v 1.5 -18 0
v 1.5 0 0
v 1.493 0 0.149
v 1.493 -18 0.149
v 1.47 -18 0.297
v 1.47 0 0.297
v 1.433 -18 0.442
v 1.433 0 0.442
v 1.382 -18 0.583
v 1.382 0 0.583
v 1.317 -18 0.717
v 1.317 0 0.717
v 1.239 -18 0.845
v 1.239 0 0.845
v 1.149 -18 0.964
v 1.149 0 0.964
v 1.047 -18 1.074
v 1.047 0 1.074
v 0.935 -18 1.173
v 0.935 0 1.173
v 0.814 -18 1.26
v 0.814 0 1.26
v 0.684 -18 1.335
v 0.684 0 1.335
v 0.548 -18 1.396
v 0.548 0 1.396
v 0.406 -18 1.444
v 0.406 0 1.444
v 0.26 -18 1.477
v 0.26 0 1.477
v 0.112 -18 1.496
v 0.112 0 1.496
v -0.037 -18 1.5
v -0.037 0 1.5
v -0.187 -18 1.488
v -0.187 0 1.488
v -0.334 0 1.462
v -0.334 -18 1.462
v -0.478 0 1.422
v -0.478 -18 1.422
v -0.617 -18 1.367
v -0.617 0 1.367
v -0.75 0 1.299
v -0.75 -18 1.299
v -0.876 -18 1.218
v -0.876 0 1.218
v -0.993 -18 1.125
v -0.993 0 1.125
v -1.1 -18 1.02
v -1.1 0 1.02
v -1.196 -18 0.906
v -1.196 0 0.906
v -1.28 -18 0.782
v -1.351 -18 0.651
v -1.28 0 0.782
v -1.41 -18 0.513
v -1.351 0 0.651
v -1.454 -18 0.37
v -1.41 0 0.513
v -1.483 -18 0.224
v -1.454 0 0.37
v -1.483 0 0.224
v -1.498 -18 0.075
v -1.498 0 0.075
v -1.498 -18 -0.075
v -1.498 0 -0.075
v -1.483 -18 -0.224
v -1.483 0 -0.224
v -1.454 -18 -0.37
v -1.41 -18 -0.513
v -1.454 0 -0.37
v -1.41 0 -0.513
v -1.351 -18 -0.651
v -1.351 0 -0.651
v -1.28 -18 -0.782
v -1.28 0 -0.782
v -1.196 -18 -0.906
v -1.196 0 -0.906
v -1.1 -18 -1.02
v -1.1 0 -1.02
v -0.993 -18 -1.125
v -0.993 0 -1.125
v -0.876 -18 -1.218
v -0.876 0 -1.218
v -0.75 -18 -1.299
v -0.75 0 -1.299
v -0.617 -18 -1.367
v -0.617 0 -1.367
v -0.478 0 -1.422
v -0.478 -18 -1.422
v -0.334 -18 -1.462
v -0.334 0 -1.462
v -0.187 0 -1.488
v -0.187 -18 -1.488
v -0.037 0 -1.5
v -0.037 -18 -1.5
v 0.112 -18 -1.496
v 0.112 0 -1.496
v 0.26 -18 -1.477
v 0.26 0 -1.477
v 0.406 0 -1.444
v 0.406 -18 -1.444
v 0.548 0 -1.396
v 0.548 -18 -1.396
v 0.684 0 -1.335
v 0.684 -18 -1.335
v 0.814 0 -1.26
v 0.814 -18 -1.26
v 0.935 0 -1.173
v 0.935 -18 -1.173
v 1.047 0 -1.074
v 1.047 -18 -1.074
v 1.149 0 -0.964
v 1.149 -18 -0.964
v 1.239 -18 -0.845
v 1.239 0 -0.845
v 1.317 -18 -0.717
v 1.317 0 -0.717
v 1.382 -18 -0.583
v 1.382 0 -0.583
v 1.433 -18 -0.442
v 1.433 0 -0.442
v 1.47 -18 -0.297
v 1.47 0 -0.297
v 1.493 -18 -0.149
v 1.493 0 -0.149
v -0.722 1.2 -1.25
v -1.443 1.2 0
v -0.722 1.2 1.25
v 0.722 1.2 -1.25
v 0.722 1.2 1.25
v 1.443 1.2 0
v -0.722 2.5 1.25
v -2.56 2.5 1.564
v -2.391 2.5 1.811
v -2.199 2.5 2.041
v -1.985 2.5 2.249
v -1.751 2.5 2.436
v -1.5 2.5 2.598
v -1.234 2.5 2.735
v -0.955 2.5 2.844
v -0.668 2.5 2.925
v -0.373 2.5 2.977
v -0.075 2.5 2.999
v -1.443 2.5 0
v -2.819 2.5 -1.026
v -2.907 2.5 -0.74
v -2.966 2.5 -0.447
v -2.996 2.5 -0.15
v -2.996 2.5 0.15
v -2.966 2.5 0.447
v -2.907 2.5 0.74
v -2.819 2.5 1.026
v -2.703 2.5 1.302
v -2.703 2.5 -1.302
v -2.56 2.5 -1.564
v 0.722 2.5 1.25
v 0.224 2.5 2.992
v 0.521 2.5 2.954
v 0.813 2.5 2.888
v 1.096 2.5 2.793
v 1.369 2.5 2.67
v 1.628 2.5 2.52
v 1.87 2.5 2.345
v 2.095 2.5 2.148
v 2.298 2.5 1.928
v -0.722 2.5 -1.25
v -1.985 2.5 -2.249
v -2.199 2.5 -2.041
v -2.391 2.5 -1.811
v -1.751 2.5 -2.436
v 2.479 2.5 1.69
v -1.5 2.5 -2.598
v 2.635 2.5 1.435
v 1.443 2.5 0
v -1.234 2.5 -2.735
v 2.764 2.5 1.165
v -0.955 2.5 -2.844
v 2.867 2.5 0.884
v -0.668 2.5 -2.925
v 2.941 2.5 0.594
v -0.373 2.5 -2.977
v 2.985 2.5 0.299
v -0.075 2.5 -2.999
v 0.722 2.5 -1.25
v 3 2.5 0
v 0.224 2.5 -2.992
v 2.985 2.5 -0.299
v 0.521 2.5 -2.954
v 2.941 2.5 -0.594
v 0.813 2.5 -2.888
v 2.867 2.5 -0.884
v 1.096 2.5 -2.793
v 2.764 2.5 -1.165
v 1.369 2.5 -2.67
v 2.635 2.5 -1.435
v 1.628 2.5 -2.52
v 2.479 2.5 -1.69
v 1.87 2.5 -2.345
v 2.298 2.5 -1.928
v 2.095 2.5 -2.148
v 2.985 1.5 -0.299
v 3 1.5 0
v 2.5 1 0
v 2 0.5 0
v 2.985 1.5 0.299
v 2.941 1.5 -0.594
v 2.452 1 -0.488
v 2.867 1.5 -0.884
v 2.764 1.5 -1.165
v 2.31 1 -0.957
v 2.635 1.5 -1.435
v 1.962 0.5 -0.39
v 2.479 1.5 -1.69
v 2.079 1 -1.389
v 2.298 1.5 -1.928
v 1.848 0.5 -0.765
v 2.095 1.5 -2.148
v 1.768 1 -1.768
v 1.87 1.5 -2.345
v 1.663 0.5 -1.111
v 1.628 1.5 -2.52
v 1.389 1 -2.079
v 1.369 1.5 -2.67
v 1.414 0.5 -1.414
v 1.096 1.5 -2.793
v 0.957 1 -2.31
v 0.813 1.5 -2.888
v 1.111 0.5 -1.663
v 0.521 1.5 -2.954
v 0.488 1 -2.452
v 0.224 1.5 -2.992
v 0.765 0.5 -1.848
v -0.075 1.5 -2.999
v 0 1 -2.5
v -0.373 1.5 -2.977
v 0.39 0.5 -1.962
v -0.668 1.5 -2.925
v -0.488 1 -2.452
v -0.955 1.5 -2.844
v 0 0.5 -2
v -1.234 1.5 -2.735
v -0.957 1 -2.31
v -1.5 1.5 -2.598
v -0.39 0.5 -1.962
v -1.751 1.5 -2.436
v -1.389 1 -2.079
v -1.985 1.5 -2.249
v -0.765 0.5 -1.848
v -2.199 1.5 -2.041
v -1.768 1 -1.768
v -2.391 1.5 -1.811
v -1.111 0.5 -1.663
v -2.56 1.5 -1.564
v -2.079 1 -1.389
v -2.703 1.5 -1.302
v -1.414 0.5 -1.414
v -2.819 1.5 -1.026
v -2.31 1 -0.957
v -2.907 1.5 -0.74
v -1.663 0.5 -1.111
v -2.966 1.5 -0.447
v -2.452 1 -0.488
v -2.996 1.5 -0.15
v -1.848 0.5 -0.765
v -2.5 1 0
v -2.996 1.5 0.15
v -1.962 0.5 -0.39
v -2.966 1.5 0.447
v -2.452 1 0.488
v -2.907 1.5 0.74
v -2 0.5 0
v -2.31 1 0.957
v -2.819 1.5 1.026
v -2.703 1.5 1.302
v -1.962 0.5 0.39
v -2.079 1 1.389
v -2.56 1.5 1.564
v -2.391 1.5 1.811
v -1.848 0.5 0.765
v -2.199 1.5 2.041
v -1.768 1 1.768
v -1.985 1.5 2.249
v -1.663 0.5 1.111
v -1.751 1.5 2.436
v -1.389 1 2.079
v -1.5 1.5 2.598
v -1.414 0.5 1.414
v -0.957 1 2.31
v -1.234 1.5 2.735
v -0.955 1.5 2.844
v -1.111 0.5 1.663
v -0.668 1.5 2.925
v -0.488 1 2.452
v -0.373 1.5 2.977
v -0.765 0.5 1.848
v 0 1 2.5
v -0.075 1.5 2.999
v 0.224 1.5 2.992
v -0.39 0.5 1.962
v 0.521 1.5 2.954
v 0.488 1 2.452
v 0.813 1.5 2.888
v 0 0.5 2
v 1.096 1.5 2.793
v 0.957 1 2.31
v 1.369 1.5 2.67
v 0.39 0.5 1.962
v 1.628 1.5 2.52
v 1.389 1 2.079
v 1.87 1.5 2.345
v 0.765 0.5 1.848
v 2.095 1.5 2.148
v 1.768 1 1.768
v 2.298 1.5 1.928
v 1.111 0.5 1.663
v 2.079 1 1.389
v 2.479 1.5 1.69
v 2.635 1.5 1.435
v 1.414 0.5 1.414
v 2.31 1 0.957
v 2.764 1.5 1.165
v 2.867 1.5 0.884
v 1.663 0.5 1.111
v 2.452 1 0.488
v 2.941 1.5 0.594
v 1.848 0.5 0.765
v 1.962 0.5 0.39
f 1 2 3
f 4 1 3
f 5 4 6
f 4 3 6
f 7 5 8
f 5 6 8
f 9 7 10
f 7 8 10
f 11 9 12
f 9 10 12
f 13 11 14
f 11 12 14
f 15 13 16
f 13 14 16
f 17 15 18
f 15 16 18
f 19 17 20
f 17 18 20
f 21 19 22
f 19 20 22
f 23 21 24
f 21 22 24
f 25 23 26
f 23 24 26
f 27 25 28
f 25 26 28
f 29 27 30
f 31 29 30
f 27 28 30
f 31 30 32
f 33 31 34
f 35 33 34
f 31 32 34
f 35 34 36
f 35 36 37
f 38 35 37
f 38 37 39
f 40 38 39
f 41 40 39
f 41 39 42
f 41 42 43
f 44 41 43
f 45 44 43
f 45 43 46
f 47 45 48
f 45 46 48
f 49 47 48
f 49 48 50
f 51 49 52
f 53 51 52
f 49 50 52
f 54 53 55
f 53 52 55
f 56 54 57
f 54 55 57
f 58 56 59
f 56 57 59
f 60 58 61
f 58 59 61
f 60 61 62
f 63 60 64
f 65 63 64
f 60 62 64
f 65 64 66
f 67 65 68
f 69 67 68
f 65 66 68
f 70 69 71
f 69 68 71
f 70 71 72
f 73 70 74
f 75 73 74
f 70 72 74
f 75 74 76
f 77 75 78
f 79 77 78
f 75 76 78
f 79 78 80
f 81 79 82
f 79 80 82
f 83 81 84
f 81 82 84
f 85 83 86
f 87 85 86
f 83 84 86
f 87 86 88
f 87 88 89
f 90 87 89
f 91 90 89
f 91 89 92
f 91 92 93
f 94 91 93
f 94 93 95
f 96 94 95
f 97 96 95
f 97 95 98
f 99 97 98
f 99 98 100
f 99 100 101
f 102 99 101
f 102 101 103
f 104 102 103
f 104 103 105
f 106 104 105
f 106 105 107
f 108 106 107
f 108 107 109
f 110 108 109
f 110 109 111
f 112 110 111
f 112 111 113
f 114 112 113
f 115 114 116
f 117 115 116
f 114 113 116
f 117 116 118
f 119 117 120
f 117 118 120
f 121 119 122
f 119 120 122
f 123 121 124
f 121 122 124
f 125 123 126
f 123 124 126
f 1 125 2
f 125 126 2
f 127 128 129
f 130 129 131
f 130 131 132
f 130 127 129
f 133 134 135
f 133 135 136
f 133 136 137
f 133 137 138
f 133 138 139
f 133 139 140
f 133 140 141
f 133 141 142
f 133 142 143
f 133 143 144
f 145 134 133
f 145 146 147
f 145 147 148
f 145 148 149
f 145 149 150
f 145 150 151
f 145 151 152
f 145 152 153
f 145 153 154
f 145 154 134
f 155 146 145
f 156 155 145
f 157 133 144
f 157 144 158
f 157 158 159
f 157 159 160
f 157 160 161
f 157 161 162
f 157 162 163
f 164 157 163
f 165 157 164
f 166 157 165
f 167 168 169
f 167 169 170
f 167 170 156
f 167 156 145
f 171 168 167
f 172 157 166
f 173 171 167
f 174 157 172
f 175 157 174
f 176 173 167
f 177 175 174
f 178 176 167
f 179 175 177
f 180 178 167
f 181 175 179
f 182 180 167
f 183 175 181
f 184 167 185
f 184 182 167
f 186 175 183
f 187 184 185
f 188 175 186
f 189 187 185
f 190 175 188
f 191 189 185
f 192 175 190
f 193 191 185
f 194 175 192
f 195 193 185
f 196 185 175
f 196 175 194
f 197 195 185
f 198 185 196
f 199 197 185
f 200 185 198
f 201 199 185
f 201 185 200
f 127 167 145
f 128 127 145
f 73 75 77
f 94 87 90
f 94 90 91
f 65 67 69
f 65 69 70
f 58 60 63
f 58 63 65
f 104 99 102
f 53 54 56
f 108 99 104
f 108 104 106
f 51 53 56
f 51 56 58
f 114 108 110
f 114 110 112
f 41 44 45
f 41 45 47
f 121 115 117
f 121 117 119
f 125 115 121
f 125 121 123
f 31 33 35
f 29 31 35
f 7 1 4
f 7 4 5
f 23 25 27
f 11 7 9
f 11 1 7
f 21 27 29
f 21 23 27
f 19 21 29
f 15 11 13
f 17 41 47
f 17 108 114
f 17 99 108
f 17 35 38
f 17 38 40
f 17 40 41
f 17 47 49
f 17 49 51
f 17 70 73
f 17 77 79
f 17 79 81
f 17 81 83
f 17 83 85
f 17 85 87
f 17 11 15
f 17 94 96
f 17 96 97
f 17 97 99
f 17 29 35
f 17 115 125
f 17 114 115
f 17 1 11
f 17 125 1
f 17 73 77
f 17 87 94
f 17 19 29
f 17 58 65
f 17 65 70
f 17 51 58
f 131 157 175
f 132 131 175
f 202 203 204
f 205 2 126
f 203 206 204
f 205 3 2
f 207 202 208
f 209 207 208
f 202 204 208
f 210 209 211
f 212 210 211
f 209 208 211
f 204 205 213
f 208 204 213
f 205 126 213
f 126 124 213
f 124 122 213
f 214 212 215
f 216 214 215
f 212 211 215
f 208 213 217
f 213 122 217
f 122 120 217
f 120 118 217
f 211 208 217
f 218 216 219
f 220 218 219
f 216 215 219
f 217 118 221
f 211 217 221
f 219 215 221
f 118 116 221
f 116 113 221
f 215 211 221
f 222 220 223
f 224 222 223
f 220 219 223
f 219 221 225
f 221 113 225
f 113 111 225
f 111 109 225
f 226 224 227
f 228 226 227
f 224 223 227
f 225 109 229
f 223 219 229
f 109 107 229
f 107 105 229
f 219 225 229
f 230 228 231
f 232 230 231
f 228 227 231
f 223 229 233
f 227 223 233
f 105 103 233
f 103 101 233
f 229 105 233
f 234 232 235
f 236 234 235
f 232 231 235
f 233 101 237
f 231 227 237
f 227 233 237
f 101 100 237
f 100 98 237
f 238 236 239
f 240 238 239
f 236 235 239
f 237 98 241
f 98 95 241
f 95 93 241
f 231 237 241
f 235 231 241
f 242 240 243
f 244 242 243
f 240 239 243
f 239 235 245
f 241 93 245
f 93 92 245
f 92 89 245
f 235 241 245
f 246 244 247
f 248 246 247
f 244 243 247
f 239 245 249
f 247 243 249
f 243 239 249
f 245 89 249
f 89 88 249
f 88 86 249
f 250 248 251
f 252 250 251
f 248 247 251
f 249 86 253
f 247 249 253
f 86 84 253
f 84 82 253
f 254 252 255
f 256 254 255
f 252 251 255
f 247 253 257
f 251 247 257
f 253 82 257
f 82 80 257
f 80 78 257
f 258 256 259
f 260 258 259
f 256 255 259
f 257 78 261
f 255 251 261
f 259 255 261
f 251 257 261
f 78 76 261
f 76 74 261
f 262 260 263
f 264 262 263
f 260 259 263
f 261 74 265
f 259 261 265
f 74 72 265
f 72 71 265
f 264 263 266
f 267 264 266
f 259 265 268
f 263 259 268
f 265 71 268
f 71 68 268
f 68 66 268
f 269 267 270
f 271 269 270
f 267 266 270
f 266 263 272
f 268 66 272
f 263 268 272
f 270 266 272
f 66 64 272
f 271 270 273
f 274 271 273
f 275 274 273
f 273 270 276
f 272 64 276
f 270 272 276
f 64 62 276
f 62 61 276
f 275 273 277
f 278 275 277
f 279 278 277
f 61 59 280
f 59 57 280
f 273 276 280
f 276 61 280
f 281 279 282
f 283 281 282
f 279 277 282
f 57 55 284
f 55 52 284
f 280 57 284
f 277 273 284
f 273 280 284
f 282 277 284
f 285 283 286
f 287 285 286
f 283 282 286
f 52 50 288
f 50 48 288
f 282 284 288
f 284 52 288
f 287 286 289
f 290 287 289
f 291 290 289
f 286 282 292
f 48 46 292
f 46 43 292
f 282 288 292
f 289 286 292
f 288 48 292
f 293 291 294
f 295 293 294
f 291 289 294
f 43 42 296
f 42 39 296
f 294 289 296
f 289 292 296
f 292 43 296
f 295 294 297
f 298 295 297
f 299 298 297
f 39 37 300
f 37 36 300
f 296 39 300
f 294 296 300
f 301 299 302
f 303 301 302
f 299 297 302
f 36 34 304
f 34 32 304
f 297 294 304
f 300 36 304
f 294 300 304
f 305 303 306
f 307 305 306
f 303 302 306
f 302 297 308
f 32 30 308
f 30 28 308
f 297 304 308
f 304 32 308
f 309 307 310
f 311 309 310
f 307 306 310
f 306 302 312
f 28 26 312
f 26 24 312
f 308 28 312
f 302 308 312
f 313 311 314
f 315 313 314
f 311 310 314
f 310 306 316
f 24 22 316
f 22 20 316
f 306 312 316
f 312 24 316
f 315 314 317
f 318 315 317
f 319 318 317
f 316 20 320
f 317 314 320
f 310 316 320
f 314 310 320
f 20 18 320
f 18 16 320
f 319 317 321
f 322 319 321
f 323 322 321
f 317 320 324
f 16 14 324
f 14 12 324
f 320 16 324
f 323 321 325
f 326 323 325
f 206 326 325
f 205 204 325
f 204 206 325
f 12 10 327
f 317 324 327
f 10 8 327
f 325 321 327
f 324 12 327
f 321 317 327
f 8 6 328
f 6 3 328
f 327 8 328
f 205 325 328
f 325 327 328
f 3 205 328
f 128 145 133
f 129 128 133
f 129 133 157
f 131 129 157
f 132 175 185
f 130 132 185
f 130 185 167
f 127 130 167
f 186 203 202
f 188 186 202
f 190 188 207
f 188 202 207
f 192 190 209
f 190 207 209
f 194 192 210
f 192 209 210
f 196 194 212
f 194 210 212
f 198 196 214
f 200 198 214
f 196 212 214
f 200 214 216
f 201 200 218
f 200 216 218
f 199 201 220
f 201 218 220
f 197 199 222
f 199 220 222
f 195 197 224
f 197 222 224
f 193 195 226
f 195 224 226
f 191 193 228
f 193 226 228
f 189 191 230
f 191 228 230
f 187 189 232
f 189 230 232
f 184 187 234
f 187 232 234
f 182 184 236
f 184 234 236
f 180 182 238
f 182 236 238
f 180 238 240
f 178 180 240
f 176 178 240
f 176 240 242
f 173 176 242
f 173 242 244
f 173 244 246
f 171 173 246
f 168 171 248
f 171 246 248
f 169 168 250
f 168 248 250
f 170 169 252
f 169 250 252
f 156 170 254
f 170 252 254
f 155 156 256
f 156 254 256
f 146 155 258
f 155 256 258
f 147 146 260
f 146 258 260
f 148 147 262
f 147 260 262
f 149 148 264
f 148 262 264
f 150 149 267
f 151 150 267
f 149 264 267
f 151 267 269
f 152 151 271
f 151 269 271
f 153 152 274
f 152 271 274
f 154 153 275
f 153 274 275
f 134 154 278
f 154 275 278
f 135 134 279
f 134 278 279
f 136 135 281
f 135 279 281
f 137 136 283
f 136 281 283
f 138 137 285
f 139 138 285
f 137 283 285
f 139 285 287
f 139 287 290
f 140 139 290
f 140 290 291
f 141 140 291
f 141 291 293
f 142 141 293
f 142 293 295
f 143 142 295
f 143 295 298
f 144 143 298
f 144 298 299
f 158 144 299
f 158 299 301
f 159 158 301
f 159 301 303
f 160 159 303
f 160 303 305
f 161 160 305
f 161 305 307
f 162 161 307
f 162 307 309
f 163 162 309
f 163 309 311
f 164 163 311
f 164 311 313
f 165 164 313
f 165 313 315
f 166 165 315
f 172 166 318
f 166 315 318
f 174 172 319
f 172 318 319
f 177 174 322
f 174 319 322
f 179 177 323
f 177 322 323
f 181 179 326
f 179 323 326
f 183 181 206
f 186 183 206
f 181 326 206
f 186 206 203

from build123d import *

# Parameters (mm, degrees)
SKETCH_1_R            = 3
EXTRUDE_251_DEPTH     = 2.5
CHAMFER_1_SIZE        = 1.5
CUT_EXTRUDE_459_DEPTH = 1.3
SKETCH_3_R            = 1.5
EXTRUDE_571_DEPTH     = 18


with BuildPart() as part:
    # 草图1 → Extrude 251 (new body)
    with BuildSketch(Plane(origin=(0, 0, 0), x_dir=(1, 0, 0), z_dir=(0, 1, 0))):
        Circle(SKETCH_1_R)
    extrude(amount=EXTRUDE_251_DEPTH)

    # 倒角1
    chamfer_1_edges = [part.edges().sort_by_distance(p)[0] for p in [
        (-3, 0, 0),
    ]]
    chamfer(chamfer_1_edges, length=CHAMFER_1_SIZE)

    # 草图2 → Cut-Extrude 459 (cut)
    with BuildSketch(Plane(origin=(0, 2.5, 0), x_dir=(1, 0, 0), z_dir=(0, 1, 0))):
        Polygon((1.443375673, 0), (0.721687836, 1.25), (-0.721687836, 1.25), (-1.443375673, 0), (-0.721687836, -1.25), (0.721687836, -1.25), align=None)
    extrude(amount=-CUT_EXTRUDE_459_DEPTH, mode=Mode.SUBTRACT)

    # 草图3 → Extrude 571 (add)
    with BuildSketch(Plane.XZ):
        Circle(SKETCH_3_R)
    extrude(amount=EXTRUDE_571_DEPTH)


solid = part.part
